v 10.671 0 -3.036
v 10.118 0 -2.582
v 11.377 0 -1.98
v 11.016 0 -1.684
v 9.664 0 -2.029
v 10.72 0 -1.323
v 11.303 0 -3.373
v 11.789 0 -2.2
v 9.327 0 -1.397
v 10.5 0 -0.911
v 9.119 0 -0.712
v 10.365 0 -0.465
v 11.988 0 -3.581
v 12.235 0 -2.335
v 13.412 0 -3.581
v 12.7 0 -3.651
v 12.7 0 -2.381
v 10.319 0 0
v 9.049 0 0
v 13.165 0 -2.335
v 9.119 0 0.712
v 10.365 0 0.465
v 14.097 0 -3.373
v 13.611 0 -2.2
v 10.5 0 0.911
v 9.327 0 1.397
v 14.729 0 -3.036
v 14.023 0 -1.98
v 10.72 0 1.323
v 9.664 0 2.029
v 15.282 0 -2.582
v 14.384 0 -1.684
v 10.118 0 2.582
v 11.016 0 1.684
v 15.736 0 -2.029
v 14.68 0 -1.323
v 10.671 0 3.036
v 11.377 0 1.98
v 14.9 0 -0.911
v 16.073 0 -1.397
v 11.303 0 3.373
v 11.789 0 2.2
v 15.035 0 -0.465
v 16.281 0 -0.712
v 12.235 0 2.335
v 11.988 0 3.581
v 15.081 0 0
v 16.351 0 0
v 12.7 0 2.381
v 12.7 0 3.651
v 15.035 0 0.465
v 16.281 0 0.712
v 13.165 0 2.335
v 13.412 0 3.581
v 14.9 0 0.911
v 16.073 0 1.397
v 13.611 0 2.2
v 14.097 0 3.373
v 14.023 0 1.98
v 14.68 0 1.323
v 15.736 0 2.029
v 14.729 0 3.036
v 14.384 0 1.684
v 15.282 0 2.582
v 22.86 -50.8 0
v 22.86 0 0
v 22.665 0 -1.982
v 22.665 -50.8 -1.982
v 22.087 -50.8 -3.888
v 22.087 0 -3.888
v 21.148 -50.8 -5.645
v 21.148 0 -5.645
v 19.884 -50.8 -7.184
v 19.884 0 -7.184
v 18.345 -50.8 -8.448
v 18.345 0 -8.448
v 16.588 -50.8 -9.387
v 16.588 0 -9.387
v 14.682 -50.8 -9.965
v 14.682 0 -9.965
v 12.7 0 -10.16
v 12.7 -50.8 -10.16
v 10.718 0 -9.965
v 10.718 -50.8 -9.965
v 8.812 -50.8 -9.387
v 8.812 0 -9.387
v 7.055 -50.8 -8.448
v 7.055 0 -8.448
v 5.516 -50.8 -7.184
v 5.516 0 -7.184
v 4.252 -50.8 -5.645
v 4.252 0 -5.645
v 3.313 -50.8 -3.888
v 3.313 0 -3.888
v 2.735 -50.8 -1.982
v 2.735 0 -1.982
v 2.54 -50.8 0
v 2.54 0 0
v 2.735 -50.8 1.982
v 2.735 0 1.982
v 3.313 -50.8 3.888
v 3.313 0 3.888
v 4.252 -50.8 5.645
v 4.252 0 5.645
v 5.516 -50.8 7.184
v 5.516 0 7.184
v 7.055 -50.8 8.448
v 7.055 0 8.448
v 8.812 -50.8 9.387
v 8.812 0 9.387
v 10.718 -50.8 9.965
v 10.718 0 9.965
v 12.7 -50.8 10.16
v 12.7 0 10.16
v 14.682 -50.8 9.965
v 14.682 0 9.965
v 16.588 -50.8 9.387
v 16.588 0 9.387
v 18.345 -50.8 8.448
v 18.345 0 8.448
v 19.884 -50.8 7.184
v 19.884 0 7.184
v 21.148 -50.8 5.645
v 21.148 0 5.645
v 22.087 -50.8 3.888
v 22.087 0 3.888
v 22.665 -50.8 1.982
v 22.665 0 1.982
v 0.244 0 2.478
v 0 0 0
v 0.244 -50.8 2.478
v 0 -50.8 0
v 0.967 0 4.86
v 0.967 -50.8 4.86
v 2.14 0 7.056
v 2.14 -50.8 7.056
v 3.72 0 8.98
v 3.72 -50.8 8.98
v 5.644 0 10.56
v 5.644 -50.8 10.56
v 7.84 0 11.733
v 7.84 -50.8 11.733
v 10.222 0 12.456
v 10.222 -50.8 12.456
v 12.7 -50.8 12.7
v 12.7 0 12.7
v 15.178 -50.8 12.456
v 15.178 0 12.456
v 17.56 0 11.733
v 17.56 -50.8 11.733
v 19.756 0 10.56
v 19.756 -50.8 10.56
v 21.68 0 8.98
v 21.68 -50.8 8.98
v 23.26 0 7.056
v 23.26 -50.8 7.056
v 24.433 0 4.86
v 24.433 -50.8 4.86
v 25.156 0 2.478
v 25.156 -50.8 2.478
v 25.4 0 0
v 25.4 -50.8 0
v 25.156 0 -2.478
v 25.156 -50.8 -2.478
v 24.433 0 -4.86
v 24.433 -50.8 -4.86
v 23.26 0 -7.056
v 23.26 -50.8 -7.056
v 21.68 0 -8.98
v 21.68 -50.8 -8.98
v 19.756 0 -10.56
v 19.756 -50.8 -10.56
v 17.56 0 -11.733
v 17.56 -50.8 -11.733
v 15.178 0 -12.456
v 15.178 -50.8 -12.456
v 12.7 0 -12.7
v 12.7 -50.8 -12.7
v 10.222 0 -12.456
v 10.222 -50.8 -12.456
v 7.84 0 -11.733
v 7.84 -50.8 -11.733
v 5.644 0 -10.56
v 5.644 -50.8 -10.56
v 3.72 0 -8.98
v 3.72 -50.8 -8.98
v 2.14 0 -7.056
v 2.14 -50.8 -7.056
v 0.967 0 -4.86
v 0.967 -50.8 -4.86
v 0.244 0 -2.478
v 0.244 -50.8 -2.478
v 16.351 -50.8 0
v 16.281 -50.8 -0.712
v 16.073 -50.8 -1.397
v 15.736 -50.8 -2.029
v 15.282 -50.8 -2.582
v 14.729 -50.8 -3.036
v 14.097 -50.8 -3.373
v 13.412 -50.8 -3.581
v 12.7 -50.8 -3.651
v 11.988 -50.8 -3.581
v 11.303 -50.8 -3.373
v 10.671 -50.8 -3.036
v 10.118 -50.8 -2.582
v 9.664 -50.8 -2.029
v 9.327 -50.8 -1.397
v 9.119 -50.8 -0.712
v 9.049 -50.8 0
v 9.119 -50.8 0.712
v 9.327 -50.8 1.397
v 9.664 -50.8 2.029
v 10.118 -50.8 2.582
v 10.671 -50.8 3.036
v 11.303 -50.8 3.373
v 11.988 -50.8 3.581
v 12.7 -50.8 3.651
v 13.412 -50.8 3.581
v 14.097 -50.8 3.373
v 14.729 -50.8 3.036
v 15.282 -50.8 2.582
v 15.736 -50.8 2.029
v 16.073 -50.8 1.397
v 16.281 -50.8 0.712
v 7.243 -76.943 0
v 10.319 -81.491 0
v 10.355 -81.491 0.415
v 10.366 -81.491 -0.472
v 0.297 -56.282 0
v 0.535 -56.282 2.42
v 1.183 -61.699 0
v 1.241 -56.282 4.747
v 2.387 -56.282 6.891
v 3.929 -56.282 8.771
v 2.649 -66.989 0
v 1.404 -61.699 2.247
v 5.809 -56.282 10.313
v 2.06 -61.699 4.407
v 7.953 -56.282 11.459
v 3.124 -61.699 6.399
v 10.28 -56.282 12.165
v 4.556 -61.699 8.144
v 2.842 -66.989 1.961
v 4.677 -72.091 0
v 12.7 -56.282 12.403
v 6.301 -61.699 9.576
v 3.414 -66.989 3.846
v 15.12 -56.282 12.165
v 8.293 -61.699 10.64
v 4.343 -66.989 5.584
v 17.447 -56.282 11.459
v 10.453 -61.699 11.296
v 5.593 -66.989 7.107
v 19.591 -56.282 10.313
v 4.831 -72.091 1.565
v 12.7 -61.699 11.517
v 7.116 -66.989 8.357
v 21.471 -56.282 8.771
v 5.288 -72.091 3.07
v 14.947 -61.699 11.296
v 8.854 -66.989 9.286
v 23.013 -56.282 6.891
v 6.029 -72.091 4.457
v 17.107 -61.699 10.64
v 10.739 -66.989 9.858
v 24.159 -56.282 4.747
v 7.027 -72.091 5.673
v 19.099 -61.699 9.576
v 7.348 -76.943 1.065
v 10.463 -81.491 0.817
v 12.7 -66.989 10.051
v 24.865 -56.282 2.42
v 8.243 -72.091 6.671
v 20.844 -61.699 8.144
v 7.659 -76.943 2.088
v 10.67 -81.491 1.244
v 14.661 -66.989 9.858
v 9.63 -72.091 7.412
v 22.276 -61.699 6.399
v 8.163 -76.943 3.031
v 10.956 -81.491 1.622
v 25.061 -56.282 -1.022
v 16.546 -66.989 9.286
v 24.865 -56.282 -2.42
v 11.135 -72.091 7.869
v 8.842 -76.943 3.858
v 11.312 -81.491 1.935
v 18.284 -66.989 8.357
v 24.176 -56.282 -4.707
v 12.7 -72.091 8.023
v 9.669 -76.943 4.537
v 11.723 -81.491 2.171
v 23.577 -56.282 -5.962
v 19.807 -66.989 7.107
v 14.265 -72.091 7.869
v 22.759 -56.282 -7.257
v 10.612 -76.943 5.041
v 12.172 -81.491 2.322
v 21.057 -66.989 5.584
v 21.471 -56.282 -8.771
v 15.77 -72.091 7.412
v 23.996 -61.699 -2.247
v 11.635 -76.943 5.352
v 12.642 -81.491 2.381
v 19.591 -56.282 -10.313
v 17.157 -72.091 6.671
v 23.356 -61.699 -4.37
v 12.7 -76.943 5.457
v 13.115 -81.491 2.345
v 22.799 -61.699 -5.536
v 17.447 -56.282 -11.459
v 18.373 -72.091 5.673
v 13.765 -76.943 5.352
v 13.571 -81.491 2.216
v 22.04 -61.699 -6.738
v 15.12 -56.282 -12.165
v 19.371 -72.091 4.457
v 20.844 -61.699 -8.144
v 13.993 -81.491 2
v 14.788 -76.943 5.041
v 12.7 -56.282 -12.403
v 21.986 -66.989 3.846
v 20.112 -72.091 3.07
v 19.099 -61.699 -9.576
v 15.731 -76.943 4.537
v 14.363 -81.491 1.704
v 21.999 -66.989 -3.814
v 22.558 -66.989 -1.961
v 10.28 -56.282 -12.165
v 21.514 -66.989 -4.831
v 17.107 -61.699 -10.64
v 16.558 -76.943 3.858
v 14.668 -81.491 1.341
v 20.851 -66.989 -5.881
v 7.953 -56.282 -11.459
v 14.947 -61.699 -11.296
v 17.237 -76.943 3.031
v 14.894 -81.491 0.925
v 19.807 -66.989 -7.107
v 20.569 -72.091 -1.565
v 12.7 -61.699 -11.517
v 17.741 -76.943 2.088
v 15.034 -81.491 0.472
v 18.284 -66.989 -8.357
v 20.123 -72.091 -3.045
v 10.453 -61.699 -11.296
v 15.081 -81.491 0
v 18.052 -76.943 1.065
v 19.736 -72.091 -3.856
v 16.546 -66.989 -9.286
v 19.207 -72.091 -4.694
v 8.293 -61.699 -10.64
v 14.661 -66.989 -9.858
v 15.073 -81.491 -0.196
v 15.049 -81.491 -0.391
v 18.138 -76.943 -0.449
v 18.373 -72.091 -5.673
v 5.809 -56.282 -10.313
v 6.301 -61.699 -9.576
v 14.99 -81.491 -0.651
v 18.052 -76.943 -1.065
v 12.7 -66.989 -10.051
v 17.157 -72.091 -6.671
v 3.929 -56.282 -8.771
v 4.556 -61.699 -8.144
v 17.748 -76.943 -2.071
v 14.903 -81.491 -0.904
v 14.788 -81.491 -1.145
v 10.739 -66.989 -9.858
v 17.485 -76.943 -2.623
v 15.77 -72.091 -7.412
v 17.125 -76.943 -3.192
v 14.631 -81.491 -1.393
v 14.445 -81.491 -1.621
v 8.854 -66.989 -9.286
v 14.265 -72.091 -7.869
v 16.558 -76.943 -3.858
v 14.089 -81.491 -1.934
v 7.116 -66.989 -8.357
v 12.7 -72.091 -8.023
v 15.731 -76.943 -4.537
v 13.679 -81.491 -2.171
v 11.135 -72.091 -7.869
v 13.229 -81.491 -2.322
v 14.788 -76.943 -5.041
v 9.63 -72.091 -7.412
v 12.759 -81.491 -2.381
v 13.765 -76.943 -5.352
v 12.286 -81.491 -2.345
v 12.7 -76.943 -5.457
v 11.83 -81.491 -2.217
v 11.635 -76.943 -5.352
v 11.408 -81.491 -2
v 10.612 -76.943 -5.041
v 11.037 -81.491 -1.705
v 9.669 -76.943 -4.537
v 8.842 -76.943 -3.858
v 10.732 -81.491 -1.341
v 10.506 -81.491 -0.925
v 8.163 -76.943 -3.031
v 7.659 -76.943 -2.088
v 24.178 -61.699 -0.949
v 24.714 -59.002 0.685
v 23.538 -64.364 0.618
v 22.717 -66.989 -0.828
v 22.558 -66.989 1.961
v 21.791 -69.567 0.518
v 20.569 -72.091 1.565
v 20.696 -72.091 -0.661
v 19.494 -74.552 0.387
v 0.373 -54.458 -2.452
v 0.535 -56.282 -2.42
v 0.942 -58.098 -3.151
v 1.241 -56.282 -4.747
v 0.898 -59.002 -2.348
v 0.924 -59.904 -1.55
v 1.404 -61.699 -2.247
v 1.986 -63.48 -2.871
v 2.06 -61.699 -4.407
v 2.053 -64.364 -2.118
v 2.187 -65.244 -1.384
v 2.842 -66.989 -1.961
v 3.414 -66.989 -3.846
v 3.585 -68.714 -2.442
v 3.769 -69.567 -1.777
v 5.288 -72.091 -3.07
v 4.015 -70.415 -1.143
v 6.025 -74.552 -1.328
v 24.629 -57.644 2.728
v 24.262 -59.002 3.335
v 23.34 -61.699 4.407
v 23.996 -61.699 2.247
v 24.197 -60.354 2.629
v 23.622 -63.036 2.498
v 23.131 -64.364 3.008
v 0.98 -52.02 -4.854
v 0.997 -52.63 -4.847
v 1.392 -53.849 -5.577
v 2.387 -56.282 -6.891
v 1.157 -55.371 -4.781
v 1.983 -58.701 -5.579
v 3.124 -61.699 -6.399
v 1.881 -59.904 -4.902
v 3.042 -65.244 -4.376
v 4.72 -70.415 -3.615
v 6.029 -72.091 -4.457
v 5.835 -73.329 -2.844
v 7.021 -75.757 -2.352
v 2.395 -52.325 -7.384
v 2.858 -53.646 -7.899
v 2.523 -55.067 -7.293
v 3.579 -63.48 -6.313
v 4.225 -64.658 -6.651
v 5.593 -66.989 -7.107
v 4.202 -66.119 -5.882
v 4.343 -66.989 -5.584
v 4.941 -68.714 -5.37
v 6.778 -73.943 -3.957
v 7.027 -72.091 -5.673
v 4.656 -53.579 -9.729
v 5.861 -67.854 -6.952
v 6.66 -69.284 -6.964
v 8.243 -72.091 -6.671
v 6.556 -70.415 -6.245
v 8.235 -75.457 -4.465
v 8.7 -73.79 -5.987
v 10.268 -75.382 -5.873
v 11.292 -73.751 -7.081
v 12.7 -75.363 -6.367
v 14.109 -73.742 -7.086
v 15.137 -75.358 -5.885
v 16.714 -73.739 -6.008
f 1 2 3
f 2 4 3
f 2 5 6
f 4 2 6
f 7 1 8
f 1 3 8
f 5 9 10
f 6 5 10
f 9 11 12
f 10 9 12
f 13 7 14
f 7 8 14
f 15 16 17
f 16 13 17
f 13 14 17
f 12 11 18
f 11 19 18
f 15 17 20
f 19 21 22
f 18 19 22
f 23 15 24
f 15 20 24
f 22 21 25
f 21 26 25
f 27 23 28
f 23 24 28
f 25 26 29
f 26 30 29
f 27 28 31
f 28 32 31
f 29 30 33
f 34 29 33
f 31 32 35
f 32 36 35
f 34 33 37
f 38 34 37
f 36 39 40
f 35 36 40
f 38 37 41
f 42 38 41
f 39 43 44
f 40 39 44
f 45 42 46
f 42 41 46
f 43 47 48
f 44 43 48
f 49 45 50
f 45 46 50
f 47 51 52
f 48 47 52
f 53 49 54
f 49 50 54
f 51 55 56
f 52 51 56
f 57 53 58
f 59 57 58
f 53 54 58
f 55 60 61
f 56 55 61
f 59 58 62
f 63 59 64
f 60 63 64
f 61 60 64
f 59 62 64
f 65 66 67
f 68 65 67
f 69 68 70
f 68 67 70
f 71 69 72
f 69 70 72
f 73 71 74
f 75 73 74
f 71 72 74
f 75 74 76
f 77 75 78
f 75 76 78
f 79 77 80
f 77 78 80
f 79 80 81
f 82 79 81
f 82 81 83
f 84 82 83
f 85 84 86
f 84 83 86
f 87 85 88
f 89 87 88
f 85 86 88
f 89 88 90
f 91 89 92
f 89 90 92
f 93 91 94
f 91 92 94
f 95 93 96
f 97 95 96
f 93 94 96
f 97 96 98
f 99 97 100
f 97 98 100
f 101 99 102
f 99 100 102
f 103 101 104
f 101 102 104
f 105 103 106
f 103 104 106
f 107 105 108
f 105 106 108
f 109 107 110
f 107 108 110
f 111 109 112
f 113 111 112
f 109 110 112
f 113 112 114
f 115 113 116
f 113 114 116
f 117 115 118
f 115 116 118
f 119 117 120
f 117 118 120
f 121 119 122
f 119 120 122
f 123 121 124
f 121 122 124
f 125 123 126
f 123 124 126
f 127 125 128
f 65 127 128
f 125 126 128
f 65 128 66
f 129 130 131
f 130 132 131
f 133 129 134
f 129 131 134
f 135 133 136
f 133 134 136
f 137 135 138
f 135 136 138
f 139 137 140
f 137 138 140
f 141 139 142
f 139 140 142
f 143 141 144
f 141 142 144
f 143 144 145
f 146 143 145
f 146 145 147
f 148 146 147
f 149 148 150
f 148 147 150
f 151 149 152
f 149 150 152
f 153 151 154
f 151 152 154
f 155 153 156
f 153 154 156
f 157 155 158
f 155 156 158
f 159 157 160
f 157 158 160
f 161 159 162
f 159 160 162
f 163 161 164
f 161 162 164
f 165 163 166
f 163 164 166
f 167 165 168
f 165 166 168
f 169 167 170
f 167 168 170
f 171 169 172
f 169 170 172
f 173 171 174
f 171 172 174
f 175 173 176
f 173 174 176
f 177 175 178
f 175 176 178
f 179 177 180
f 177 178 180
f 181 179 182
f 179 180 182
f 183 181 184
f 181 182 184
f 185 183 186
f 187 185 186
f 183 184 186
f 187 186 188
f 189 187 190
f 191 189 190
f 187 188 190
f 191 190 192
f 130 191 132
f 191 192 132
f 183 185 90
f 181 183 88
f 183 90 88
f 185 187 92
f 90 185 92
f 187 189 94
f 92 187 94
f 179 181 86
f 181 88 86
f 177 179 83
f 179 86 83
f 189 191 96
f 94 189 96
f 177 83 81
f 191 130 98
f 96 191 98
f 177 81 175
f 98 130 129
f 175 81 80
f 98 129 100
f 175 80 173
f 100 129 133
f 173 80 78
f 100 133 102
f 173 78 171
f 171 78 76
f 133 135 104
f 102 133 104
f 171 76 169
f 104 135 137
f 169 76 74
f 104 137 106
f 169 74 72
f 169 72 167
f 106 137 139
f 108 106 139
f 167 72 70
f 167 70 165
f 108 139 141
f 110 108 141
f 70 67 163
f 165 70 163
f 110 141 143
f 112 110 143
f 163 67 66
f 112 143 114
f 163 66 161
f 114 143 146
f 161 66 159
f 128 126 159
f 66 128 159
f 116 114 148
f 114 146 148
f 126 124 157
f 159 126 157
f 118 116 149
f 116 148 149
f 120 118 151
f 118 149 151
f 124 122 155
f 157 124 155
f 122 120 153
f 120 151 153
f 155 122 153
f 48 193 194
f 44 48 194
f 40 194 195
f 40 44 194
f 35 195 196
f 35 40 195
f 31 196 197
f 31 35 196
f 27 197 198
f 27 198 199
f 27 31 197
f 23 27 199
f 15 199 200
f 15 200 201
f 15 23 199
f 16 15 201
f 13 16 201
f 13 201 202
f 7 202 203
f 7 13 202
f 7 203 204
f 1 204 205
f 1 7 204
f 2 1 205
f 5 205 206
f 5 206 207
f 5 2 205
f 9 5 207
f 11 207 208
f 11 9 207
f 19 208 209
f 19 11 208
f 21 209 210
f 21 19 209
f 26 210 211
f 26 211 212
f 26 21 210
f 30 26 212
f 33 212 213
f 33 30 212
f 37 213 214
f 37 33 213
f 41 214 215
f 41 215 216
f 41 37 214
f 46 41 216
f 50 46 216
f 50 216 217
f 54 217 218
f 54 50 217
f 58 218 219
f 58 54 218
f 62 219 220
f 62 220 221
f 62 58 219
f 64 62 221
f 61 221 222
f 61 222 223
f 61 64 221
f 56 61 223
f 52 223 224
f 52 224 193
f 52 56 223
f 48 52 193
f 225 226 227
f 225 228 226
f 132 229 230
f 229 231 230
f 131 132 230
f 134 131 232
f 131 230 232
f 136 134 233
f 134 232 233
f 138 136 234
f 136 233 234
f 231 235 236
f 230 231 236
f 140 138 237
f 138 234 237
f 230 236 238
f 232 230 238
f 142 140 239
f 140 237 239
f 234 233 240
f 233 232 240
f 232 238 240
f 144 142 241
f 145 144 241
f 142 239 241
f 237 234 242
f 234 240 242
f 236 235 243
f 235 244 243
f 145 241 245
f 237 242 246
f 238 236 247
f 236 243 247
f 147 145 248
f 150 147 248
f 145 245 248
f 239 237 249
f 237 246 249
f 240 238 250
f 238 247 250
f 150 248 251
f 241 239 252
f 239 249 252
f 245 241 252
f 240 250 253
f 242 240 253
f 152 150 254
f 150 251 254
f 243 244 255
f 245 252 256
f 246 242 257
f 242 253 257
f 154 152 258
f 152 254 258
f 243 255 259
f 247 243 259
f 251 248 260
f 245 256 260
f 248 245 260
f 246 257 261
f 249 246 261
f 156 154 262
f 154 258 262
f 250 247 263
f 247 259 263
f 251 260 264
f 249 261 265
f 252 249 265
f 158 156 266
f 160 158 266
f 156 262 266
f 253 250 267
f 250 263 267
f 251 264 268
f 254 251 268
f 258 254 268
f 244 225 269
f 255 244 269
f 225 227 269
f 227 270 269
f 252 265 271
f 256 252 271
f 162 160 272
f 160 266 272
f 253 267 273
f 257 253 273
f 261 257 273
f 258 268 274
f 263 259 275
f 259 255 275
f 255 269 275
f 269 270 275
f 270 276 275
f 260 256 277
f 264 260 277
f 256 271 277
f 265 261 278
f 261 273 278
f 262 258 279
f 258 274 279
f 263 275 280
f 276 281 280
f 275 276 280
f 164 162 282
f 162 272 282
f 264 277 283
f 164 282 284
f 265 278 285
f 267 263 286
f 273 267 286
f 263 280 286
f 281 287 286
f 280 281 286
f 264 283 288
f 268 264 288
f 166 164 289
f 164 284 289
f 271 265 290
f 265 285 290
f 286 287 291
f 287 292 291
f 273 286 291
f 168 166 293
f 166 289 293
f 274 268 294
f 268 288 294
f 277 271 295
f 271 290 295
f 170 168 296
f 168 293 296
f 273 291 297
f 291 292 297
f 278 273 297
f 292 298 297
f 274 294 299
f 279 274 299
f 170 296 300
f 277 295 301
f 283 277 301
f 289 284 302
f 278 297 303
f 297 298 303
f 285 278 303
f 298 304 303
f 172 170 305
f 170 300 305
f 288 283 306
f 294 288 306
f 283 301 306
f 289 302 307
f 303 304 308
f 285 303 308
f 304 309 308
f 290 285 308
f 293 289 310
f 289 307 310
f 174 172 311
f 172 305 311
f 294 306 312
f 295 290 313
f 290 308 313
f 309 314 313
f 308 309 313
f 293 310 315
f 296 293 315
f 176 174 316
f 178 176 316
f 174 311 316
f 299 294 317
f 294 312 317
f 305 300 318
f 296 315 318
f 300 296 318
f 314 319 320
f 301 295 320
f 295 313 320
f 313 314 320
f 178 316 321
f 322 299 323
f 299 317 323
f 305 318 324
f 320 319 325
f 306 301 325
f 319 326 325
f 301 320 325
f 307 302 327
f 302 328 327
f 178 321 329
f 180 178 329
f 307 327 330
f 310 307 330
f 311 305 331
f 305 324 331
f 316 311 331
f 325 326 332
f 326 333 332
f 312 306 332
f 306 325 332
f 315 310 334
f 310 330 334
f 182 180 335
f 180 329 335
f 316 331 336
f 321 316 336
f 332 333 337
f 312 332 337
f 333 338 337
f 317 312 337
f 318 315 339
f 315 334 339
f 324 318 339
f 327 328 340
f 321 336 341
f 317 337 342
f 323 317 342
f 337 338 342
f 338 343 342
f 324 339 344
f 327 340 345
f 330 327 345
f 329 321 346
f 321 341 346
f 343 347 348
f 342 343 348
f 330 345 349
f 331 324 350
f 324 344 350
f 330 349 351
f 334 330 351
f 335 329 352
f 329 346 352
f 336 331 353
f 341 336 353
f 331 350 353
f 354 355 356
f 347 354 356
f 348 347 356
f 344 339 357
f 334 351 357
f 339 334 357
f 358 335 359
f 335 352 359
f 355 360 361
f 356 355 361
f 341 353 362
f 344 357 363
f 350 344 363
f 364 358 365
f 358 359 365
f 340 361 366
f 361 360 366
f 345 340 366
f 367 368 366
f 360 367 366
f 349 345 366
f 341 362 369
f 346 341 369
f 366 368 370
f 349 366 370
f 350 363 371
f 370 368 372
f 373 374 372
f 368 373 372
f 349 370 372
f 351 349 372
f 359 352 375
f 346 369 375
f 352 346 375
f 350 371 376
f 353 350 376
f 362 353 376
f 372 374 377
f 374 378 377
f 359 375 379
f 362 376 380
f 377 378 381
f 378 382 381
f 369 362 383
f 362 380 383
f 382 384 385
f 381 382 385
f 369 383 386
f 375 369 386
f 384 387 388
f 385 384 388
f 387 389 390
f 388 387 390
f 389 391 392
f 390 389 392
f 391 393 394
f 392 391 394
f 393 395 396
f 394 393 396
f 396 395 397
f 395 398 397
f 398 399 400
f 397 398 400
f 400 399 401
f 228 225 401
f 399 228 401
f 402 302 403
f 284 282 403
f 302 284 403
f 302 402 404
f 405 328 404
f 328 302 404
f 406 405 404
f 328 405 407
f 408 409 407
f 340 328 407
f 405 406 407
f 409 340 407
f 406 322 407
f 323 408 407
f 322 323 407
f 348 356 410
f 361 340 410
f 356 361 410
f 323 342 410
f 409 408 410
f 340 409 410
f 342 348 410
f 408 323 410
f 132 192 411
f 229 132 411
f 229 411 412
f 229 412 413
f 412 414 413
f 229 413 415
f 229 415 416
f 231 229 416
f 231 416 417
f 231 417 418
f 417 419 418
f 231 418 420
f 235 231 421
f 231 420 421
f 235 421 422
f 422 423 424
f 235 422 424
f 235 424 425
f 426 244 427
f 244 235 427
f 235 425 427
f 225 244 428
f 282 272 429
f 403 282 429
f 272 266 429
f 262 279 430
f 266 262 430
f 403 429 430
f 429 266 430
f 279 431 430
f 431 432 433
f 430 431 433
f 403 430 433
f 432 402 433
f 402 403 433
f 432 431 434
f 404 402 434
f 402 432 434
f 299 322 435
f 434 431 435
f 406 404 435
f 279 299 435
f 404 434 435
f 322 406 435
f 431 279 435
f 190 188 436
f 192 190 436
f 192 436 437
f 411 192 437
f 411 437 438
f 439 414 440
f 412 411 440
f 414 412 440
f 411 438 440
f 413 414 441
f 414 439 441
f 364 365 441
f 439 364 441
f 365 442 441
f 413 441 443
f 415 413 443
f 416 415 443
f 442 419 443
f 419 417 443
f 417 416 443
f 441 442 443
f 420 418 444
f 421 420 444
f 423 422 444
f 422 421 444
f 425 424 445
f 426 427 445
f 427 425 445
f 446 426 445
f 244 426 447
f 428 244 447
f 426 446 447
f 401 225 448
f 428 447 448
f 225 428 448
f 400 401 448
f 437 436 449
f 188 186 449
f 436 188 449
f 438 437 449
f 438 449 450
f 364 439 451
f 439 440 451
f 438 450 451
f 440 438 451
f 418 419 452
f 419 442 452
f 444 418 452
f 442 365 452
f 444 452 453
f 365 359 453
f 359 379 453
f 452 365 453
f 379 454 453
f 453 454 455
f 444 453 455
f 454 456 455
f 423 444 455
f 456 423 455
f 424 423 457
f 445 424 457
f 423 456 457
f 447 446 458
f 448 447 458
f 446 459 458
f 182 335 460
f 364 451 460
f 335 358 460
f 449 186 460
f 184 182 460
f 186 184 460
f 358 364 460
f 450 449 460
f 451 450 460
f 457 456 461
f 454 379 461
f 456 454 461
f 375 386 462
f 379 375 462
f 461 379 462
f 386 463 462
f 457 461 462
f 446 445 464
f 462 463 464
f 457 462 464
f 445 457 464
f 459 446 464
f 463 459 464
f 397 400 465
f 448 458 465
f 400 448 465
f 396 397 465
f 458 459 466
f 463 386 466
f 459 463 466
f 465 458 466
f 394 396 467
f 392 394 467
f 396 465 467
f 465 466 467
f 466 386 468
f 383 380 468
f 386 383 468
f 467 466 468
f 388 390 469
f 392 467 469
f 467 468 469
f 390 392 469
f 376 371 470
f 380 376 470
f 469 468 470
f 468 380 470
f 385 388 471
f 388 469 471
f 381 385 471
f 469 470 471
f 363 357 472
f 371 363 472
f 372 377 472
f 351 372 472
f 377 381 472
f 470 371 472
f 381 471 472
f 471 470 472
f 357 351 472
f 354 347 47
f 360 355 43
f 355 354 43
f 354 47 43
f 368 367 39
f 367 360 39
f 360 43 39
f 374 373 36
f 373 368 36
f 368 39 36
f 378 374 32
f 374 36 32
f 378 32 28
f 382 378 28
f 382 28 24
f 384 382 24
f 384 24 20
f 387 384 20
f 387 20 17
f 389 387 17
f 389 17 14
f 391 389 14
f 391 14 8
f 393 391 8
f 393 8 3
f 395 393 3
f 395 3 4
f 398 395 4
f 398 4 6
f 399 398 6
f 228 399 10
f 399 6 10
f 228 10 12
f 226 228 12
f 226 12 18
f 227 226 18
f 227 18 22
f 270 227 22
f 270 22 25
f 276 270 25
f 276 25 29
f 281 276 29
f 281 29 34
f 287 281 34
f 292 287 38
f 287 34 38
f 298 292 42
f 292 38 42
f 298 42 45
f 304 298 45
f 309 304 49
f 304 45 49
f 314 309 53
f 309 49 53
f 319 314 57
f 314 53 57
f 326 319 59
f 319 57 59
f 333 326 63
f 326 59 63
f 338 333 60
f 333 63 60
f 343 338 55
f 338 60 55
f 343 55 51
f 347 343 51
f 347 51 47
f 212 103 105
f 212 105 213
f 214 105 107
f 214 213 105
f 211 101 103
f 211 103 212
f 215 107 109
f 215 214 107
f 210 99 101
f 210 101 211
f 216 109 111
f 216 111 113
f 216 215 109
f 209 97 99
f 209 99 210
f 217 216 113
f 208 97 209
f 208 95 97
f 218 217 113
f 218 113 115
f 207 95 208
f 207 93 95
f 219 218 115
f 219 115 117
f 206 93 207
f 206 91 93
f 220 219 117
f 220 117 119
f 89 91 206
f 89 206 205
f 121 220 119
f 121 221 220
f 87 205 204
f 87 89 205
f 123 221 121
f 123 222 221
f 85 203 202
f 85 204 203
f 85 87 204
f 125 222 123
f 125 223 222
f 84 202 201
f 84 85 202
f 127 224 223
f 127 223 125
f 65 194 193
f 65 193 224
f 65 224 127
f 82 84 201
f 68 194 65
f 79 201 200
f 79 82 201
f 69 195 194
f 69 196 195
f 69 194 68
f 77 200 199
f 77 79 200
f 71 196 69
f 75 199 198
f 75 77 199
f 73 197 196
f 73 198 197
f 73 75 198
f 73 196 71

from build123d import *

# Parameters (mm, degrees)
SKETCH2_R          = 2.38125
CUT_EXTRUDE1_DEPTH = 85.401041751
SKETCH5_R          = 10.16
SKETCH5_R_2        = 3.65125
CUT_EXTRUDE4_DEPTH = 50.8


with BuildPart() as part:
    # Sketch1 → Revolve1 (revolve)
    with BuildSketch(Plane.XY):
        with BuildLine():
            Line((0, 0), (0, -50.8))
            ThreePointArc((0, -50.8), (3.280951188, -68.760512242), (12.7, -84.401041651))
            Line((12.7, -84.401041651), (12.7, 0))
            Line((12.7, 0), (0, 0))
        make_face()
    revolve(axis=Axis((12.7, -84.401041651, 0), (0, 1, 0)))

    # Sketch2 → Cut-Extrude1 (cut, through all)
    with BuildSketch(Plane(origin=(0, 0, 0), x_dir=(1, 0, 0), z_dir=(0, 1, 0))):
        with Locations((12.7, 0)):
            Circle(SKETCH2_R)
    extrude(amount=-CUT_EXTRUDE1_DEPTH, mode=Mode.SUBTRACT)

    # Sketch5 → Cut-Extrude4 (cut)
    with BuildSketch(Plane(origin=(0, 0, 0), x_dir=(1, 0, 0), z_dir=(0, 1, 0))):
        with Locations((12.7, 0)):
            Circle(SKETCH5_R)
        with Locations((12.7, 0)):
            Circle(SKETCH5_R_2, mode=Mode.SUBTRACT)
    extrude(amount=-CUT_EXTRUDE4_DEPTH, mode=Mode.SUBTRACT)


solid = part.part
